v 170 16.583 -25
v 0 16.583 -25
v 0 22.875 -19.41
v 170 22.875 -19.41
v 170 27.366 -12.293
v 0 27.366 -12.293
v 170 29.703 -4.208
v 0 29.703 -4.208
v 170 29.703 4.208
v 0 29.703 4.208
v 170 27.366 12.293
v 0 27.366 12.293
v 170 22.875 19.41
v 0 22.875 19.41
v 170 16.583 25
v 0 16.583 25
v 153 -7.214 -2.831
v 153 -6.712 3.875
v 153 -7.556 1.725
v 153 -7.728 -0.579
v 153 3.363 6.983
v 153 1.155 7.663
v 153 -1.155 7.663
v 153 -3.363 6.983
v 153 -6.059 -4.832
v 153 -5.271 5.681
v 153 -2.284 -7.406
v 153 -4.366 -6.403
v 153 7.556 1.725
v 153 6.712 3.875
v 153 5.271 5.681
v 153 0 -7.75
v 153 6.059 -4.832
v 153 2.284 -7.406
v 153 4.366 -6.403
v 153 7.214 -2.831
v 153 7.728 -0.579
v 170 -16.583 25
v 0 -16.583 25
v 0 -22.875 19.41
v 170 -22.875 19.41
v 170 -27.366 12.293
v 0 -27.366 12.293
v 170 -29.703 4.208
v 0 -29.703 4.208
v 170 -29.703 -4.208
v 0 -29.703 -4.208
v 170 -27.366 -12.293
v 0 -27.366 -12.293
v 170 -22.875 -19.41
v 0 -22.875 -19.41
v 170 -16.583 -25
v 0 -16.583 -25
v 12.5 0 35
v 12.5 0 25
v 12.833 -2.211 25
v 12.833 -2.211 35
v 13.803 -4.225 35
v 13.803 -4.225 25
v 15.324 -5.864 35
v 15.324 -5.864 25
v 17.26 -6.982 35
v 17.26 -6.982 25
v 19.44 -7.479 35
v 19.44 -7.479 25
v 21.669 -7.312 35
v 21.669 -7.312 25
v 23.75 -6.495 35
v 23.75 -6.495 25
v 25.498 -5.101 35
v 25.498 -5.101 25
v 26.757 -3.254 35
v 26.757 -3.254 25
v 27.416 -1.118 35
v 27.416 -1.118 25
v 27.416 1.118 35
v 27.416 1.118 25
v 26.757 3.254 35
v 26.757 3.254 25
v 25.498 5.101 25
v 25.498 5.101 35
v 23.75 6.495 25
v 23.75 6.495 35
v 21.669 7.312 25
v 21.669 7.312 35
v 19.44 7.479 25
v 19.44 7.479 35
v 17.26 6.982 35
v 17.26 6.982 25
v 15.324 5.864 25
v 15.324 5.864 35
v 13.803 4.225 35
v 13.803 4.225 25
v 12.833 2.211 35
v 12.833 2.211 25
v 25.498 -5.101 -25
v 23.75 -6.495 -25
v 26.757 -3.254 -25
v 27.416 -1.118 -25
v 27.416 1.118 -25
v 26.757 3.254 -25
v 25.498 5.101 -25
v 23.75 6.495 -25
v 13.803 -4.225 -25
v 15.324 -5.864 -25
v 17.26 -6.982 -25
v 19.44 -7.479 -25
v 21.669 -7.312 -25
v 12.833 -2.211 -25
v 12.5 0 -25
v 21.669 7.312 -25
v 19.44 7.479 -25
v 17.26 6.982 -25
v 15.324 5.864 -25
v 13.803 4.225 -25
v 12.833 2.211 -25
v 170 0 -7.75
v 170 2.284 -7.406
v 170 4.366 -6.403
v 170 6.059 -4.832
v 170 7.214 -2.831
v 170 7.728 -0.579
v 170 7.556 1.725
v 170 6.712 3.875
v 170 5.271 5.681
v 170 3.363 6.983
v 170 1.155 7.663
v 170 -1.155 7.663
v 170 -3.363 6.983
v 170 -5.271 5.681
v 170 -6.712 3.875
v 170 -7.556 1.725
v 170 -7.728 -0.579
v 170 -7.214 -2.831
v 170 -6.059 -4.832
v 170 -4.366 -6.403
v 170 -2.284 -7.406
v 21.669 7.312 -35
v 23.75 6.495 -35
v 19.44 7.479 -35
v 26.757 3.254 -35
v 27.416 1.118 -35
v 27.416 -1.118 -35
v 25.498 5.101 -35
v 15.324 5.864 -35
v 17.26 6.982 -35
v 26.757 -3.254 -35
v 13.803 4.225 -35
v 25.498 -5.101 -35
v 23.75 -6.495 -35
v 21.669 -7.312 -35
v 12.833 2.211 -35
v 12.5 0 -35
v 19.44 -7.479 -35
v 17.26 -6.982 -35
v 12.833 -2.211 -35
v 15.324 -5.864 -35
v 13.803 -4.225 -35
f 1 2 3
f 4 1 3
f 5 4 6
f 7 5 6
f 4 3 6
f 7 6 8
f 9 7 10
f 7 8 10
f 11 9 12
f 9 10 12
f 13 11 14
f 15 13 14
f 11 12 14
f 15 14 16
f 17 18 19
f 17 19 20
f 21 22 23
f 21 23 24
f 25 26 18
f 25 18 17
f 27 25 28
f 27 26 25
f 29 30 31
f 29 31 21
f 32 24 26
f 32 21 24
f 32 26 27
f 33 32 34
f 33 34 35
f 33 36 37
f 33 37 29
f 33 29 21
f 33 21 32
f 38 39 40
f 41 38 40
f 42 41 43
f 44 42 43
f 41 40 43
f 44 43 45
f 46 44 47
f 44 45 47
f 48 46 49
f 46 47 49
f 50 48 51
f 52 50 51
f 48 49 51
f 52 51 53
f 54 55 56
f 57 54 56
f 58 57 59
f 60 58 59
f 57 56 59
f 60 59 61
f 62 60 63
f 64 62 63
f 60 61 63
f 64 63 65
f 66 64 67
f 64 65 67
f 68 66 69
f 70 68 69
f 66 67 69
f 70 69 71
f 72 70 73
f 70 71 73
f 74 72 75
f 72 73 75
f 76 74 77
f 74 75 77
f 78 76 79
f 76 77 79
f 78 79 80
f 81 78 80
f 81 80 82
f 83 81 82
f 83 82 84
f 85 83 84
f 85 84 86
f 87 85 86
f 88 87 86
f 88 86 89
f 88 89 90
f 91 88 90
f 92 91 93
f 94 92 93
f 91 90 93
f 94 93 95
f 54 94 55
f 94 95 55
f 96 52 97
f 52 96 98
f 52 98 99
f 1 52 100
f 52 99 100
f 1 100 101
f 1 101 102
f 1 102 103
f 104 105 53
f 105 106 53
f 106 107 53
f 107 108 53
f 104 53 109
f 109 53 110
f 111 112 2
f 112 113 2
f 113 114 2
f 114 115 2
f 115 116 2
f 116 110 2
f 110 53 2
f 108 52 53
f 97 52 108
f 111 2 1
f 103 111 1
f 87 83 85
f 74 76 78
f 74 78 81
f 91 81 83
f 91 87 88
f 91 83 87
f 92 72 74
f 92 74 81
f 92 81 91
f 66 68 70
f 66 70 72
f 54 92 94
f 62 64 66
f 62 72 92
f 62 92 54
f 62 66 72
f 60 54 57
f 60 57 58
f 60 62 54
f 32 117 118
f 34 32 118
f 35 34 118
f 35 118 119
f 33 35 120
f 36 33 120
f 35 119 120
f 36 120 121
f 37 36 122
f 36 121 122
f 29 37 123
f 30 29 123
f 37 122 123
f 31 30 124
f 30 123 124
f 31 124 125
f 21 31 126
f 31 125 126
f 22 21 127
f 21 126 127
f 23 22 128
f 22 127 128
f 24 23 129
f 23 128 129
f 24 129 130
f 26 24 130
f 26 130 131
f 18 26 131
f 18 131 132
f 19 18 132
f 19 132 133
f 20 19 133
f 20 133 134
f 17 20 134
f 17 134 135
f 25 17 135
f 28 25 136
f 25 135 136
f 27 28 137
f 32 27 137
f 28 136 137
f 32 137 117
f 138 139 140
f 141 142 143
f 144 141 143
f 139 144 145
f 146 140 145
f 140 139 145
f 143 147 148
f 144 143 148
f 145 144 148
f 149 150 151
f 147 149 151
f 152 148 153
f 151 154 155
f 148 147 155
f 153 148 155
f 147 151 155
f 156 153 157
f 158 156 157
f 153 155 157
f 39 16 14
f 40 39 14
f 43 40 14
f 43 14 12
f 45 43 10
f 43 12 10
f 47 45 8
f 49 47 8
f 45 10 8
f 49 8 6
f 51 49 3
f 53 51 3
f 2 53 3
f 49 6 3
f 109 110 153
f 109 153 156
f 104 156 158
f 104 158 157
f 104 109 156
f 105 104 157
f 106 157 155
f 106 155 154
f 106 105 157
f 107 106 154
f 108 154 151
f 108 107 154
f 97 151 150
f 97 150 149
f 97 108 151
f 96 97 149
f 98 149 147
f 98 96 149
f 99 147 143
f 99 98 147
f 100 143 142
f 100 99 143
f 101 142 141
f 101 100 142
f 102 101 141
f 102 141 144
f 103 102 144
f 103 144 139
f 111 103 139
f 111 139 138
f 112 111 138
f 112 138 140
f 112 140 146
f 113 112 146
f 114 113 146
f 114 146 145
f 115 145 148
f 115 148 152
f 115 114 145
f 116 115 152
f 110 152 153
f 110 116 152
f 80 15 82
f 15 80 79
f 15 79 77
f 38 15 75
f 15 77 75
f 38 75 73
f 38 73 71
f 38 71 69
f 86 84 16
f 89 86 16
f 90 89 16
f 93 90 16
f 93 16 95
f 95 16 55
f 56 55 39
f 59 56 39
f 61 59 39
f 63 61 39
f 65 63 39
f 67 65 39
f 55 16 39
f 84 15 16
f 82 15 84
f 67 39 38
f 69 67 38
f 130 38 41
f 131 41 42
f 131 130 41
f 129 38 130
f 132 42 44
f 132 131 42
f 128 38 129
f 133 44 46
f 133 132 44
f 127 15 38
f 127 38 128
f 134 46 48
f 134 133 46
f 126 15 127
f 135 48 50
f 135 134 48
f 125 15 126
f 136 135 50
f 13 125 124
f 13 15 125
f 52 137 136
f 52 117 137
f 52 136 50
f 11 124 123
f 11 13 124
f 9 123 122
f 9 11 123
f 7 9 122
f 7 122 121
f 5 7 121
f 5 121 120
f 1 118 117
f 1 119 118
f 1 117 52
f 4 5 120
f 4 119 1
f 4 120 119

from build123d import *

# Parameters (mm, degrees)
BOSS_EXTRUDE1_DEPTH = 170
SKETCH3_R           = 7.5
BOSS_EXTRUDE2_DEPTH = 10
SKETCH4_R           = 7.75
CUT_EXTRUDE1_DEPTH  = 17


with BuildPart() as part:
    # Sketch1 → Boss-Extrude1 (new body)
    with BuildSketch(Plane(origin=(0, 0, 0), x_dir=(0, 0, -1), z_dir=(1, 0, 0))):
        with BuildLine():
            Line((-25, 16.583123952), (-25, -16.583123952))
            ThreePointArc((-25, -16.583123952), (0, -30), (25, -16.583123952))
            Line((25, -16.583123952), (25, 16.583123952))
            ThreePointArc((25, 16.583123952), (0, 30), (-25, 16.583123952))
        make_face()
    extrude(amount=BOSS_EXTRUDE1_DEPTH)

    # Sketch3 → Boss-Extrude2 (add)
    with BuildSketch(Plane.XY.offset(25)):
        with Locations(Location((20, 0, 0), (0, 0, 180))):
            Circle(SKETCH3_R)
    boss_extrude2 = extrude(amount=BOSS_EXTRUDE2_DEPTH)

    # Mirror1: Boss-Extrude2 across plane
    add(boss_extrude2.mirror(Plane.XY))

    # Sketch4 → Cut-Extrude1 (cut)
    with BuildSketch(Plane(origin=(170, 0, 0), x_dir=(0, 0, -1), z_dir=(1, 0, 0))):
        Circle(SKETCH4_R)
    extrude(amount=-CUT_EXTRUDE1_DEPTH, mode=Mode.SUBTRACT)


solid = part.part
